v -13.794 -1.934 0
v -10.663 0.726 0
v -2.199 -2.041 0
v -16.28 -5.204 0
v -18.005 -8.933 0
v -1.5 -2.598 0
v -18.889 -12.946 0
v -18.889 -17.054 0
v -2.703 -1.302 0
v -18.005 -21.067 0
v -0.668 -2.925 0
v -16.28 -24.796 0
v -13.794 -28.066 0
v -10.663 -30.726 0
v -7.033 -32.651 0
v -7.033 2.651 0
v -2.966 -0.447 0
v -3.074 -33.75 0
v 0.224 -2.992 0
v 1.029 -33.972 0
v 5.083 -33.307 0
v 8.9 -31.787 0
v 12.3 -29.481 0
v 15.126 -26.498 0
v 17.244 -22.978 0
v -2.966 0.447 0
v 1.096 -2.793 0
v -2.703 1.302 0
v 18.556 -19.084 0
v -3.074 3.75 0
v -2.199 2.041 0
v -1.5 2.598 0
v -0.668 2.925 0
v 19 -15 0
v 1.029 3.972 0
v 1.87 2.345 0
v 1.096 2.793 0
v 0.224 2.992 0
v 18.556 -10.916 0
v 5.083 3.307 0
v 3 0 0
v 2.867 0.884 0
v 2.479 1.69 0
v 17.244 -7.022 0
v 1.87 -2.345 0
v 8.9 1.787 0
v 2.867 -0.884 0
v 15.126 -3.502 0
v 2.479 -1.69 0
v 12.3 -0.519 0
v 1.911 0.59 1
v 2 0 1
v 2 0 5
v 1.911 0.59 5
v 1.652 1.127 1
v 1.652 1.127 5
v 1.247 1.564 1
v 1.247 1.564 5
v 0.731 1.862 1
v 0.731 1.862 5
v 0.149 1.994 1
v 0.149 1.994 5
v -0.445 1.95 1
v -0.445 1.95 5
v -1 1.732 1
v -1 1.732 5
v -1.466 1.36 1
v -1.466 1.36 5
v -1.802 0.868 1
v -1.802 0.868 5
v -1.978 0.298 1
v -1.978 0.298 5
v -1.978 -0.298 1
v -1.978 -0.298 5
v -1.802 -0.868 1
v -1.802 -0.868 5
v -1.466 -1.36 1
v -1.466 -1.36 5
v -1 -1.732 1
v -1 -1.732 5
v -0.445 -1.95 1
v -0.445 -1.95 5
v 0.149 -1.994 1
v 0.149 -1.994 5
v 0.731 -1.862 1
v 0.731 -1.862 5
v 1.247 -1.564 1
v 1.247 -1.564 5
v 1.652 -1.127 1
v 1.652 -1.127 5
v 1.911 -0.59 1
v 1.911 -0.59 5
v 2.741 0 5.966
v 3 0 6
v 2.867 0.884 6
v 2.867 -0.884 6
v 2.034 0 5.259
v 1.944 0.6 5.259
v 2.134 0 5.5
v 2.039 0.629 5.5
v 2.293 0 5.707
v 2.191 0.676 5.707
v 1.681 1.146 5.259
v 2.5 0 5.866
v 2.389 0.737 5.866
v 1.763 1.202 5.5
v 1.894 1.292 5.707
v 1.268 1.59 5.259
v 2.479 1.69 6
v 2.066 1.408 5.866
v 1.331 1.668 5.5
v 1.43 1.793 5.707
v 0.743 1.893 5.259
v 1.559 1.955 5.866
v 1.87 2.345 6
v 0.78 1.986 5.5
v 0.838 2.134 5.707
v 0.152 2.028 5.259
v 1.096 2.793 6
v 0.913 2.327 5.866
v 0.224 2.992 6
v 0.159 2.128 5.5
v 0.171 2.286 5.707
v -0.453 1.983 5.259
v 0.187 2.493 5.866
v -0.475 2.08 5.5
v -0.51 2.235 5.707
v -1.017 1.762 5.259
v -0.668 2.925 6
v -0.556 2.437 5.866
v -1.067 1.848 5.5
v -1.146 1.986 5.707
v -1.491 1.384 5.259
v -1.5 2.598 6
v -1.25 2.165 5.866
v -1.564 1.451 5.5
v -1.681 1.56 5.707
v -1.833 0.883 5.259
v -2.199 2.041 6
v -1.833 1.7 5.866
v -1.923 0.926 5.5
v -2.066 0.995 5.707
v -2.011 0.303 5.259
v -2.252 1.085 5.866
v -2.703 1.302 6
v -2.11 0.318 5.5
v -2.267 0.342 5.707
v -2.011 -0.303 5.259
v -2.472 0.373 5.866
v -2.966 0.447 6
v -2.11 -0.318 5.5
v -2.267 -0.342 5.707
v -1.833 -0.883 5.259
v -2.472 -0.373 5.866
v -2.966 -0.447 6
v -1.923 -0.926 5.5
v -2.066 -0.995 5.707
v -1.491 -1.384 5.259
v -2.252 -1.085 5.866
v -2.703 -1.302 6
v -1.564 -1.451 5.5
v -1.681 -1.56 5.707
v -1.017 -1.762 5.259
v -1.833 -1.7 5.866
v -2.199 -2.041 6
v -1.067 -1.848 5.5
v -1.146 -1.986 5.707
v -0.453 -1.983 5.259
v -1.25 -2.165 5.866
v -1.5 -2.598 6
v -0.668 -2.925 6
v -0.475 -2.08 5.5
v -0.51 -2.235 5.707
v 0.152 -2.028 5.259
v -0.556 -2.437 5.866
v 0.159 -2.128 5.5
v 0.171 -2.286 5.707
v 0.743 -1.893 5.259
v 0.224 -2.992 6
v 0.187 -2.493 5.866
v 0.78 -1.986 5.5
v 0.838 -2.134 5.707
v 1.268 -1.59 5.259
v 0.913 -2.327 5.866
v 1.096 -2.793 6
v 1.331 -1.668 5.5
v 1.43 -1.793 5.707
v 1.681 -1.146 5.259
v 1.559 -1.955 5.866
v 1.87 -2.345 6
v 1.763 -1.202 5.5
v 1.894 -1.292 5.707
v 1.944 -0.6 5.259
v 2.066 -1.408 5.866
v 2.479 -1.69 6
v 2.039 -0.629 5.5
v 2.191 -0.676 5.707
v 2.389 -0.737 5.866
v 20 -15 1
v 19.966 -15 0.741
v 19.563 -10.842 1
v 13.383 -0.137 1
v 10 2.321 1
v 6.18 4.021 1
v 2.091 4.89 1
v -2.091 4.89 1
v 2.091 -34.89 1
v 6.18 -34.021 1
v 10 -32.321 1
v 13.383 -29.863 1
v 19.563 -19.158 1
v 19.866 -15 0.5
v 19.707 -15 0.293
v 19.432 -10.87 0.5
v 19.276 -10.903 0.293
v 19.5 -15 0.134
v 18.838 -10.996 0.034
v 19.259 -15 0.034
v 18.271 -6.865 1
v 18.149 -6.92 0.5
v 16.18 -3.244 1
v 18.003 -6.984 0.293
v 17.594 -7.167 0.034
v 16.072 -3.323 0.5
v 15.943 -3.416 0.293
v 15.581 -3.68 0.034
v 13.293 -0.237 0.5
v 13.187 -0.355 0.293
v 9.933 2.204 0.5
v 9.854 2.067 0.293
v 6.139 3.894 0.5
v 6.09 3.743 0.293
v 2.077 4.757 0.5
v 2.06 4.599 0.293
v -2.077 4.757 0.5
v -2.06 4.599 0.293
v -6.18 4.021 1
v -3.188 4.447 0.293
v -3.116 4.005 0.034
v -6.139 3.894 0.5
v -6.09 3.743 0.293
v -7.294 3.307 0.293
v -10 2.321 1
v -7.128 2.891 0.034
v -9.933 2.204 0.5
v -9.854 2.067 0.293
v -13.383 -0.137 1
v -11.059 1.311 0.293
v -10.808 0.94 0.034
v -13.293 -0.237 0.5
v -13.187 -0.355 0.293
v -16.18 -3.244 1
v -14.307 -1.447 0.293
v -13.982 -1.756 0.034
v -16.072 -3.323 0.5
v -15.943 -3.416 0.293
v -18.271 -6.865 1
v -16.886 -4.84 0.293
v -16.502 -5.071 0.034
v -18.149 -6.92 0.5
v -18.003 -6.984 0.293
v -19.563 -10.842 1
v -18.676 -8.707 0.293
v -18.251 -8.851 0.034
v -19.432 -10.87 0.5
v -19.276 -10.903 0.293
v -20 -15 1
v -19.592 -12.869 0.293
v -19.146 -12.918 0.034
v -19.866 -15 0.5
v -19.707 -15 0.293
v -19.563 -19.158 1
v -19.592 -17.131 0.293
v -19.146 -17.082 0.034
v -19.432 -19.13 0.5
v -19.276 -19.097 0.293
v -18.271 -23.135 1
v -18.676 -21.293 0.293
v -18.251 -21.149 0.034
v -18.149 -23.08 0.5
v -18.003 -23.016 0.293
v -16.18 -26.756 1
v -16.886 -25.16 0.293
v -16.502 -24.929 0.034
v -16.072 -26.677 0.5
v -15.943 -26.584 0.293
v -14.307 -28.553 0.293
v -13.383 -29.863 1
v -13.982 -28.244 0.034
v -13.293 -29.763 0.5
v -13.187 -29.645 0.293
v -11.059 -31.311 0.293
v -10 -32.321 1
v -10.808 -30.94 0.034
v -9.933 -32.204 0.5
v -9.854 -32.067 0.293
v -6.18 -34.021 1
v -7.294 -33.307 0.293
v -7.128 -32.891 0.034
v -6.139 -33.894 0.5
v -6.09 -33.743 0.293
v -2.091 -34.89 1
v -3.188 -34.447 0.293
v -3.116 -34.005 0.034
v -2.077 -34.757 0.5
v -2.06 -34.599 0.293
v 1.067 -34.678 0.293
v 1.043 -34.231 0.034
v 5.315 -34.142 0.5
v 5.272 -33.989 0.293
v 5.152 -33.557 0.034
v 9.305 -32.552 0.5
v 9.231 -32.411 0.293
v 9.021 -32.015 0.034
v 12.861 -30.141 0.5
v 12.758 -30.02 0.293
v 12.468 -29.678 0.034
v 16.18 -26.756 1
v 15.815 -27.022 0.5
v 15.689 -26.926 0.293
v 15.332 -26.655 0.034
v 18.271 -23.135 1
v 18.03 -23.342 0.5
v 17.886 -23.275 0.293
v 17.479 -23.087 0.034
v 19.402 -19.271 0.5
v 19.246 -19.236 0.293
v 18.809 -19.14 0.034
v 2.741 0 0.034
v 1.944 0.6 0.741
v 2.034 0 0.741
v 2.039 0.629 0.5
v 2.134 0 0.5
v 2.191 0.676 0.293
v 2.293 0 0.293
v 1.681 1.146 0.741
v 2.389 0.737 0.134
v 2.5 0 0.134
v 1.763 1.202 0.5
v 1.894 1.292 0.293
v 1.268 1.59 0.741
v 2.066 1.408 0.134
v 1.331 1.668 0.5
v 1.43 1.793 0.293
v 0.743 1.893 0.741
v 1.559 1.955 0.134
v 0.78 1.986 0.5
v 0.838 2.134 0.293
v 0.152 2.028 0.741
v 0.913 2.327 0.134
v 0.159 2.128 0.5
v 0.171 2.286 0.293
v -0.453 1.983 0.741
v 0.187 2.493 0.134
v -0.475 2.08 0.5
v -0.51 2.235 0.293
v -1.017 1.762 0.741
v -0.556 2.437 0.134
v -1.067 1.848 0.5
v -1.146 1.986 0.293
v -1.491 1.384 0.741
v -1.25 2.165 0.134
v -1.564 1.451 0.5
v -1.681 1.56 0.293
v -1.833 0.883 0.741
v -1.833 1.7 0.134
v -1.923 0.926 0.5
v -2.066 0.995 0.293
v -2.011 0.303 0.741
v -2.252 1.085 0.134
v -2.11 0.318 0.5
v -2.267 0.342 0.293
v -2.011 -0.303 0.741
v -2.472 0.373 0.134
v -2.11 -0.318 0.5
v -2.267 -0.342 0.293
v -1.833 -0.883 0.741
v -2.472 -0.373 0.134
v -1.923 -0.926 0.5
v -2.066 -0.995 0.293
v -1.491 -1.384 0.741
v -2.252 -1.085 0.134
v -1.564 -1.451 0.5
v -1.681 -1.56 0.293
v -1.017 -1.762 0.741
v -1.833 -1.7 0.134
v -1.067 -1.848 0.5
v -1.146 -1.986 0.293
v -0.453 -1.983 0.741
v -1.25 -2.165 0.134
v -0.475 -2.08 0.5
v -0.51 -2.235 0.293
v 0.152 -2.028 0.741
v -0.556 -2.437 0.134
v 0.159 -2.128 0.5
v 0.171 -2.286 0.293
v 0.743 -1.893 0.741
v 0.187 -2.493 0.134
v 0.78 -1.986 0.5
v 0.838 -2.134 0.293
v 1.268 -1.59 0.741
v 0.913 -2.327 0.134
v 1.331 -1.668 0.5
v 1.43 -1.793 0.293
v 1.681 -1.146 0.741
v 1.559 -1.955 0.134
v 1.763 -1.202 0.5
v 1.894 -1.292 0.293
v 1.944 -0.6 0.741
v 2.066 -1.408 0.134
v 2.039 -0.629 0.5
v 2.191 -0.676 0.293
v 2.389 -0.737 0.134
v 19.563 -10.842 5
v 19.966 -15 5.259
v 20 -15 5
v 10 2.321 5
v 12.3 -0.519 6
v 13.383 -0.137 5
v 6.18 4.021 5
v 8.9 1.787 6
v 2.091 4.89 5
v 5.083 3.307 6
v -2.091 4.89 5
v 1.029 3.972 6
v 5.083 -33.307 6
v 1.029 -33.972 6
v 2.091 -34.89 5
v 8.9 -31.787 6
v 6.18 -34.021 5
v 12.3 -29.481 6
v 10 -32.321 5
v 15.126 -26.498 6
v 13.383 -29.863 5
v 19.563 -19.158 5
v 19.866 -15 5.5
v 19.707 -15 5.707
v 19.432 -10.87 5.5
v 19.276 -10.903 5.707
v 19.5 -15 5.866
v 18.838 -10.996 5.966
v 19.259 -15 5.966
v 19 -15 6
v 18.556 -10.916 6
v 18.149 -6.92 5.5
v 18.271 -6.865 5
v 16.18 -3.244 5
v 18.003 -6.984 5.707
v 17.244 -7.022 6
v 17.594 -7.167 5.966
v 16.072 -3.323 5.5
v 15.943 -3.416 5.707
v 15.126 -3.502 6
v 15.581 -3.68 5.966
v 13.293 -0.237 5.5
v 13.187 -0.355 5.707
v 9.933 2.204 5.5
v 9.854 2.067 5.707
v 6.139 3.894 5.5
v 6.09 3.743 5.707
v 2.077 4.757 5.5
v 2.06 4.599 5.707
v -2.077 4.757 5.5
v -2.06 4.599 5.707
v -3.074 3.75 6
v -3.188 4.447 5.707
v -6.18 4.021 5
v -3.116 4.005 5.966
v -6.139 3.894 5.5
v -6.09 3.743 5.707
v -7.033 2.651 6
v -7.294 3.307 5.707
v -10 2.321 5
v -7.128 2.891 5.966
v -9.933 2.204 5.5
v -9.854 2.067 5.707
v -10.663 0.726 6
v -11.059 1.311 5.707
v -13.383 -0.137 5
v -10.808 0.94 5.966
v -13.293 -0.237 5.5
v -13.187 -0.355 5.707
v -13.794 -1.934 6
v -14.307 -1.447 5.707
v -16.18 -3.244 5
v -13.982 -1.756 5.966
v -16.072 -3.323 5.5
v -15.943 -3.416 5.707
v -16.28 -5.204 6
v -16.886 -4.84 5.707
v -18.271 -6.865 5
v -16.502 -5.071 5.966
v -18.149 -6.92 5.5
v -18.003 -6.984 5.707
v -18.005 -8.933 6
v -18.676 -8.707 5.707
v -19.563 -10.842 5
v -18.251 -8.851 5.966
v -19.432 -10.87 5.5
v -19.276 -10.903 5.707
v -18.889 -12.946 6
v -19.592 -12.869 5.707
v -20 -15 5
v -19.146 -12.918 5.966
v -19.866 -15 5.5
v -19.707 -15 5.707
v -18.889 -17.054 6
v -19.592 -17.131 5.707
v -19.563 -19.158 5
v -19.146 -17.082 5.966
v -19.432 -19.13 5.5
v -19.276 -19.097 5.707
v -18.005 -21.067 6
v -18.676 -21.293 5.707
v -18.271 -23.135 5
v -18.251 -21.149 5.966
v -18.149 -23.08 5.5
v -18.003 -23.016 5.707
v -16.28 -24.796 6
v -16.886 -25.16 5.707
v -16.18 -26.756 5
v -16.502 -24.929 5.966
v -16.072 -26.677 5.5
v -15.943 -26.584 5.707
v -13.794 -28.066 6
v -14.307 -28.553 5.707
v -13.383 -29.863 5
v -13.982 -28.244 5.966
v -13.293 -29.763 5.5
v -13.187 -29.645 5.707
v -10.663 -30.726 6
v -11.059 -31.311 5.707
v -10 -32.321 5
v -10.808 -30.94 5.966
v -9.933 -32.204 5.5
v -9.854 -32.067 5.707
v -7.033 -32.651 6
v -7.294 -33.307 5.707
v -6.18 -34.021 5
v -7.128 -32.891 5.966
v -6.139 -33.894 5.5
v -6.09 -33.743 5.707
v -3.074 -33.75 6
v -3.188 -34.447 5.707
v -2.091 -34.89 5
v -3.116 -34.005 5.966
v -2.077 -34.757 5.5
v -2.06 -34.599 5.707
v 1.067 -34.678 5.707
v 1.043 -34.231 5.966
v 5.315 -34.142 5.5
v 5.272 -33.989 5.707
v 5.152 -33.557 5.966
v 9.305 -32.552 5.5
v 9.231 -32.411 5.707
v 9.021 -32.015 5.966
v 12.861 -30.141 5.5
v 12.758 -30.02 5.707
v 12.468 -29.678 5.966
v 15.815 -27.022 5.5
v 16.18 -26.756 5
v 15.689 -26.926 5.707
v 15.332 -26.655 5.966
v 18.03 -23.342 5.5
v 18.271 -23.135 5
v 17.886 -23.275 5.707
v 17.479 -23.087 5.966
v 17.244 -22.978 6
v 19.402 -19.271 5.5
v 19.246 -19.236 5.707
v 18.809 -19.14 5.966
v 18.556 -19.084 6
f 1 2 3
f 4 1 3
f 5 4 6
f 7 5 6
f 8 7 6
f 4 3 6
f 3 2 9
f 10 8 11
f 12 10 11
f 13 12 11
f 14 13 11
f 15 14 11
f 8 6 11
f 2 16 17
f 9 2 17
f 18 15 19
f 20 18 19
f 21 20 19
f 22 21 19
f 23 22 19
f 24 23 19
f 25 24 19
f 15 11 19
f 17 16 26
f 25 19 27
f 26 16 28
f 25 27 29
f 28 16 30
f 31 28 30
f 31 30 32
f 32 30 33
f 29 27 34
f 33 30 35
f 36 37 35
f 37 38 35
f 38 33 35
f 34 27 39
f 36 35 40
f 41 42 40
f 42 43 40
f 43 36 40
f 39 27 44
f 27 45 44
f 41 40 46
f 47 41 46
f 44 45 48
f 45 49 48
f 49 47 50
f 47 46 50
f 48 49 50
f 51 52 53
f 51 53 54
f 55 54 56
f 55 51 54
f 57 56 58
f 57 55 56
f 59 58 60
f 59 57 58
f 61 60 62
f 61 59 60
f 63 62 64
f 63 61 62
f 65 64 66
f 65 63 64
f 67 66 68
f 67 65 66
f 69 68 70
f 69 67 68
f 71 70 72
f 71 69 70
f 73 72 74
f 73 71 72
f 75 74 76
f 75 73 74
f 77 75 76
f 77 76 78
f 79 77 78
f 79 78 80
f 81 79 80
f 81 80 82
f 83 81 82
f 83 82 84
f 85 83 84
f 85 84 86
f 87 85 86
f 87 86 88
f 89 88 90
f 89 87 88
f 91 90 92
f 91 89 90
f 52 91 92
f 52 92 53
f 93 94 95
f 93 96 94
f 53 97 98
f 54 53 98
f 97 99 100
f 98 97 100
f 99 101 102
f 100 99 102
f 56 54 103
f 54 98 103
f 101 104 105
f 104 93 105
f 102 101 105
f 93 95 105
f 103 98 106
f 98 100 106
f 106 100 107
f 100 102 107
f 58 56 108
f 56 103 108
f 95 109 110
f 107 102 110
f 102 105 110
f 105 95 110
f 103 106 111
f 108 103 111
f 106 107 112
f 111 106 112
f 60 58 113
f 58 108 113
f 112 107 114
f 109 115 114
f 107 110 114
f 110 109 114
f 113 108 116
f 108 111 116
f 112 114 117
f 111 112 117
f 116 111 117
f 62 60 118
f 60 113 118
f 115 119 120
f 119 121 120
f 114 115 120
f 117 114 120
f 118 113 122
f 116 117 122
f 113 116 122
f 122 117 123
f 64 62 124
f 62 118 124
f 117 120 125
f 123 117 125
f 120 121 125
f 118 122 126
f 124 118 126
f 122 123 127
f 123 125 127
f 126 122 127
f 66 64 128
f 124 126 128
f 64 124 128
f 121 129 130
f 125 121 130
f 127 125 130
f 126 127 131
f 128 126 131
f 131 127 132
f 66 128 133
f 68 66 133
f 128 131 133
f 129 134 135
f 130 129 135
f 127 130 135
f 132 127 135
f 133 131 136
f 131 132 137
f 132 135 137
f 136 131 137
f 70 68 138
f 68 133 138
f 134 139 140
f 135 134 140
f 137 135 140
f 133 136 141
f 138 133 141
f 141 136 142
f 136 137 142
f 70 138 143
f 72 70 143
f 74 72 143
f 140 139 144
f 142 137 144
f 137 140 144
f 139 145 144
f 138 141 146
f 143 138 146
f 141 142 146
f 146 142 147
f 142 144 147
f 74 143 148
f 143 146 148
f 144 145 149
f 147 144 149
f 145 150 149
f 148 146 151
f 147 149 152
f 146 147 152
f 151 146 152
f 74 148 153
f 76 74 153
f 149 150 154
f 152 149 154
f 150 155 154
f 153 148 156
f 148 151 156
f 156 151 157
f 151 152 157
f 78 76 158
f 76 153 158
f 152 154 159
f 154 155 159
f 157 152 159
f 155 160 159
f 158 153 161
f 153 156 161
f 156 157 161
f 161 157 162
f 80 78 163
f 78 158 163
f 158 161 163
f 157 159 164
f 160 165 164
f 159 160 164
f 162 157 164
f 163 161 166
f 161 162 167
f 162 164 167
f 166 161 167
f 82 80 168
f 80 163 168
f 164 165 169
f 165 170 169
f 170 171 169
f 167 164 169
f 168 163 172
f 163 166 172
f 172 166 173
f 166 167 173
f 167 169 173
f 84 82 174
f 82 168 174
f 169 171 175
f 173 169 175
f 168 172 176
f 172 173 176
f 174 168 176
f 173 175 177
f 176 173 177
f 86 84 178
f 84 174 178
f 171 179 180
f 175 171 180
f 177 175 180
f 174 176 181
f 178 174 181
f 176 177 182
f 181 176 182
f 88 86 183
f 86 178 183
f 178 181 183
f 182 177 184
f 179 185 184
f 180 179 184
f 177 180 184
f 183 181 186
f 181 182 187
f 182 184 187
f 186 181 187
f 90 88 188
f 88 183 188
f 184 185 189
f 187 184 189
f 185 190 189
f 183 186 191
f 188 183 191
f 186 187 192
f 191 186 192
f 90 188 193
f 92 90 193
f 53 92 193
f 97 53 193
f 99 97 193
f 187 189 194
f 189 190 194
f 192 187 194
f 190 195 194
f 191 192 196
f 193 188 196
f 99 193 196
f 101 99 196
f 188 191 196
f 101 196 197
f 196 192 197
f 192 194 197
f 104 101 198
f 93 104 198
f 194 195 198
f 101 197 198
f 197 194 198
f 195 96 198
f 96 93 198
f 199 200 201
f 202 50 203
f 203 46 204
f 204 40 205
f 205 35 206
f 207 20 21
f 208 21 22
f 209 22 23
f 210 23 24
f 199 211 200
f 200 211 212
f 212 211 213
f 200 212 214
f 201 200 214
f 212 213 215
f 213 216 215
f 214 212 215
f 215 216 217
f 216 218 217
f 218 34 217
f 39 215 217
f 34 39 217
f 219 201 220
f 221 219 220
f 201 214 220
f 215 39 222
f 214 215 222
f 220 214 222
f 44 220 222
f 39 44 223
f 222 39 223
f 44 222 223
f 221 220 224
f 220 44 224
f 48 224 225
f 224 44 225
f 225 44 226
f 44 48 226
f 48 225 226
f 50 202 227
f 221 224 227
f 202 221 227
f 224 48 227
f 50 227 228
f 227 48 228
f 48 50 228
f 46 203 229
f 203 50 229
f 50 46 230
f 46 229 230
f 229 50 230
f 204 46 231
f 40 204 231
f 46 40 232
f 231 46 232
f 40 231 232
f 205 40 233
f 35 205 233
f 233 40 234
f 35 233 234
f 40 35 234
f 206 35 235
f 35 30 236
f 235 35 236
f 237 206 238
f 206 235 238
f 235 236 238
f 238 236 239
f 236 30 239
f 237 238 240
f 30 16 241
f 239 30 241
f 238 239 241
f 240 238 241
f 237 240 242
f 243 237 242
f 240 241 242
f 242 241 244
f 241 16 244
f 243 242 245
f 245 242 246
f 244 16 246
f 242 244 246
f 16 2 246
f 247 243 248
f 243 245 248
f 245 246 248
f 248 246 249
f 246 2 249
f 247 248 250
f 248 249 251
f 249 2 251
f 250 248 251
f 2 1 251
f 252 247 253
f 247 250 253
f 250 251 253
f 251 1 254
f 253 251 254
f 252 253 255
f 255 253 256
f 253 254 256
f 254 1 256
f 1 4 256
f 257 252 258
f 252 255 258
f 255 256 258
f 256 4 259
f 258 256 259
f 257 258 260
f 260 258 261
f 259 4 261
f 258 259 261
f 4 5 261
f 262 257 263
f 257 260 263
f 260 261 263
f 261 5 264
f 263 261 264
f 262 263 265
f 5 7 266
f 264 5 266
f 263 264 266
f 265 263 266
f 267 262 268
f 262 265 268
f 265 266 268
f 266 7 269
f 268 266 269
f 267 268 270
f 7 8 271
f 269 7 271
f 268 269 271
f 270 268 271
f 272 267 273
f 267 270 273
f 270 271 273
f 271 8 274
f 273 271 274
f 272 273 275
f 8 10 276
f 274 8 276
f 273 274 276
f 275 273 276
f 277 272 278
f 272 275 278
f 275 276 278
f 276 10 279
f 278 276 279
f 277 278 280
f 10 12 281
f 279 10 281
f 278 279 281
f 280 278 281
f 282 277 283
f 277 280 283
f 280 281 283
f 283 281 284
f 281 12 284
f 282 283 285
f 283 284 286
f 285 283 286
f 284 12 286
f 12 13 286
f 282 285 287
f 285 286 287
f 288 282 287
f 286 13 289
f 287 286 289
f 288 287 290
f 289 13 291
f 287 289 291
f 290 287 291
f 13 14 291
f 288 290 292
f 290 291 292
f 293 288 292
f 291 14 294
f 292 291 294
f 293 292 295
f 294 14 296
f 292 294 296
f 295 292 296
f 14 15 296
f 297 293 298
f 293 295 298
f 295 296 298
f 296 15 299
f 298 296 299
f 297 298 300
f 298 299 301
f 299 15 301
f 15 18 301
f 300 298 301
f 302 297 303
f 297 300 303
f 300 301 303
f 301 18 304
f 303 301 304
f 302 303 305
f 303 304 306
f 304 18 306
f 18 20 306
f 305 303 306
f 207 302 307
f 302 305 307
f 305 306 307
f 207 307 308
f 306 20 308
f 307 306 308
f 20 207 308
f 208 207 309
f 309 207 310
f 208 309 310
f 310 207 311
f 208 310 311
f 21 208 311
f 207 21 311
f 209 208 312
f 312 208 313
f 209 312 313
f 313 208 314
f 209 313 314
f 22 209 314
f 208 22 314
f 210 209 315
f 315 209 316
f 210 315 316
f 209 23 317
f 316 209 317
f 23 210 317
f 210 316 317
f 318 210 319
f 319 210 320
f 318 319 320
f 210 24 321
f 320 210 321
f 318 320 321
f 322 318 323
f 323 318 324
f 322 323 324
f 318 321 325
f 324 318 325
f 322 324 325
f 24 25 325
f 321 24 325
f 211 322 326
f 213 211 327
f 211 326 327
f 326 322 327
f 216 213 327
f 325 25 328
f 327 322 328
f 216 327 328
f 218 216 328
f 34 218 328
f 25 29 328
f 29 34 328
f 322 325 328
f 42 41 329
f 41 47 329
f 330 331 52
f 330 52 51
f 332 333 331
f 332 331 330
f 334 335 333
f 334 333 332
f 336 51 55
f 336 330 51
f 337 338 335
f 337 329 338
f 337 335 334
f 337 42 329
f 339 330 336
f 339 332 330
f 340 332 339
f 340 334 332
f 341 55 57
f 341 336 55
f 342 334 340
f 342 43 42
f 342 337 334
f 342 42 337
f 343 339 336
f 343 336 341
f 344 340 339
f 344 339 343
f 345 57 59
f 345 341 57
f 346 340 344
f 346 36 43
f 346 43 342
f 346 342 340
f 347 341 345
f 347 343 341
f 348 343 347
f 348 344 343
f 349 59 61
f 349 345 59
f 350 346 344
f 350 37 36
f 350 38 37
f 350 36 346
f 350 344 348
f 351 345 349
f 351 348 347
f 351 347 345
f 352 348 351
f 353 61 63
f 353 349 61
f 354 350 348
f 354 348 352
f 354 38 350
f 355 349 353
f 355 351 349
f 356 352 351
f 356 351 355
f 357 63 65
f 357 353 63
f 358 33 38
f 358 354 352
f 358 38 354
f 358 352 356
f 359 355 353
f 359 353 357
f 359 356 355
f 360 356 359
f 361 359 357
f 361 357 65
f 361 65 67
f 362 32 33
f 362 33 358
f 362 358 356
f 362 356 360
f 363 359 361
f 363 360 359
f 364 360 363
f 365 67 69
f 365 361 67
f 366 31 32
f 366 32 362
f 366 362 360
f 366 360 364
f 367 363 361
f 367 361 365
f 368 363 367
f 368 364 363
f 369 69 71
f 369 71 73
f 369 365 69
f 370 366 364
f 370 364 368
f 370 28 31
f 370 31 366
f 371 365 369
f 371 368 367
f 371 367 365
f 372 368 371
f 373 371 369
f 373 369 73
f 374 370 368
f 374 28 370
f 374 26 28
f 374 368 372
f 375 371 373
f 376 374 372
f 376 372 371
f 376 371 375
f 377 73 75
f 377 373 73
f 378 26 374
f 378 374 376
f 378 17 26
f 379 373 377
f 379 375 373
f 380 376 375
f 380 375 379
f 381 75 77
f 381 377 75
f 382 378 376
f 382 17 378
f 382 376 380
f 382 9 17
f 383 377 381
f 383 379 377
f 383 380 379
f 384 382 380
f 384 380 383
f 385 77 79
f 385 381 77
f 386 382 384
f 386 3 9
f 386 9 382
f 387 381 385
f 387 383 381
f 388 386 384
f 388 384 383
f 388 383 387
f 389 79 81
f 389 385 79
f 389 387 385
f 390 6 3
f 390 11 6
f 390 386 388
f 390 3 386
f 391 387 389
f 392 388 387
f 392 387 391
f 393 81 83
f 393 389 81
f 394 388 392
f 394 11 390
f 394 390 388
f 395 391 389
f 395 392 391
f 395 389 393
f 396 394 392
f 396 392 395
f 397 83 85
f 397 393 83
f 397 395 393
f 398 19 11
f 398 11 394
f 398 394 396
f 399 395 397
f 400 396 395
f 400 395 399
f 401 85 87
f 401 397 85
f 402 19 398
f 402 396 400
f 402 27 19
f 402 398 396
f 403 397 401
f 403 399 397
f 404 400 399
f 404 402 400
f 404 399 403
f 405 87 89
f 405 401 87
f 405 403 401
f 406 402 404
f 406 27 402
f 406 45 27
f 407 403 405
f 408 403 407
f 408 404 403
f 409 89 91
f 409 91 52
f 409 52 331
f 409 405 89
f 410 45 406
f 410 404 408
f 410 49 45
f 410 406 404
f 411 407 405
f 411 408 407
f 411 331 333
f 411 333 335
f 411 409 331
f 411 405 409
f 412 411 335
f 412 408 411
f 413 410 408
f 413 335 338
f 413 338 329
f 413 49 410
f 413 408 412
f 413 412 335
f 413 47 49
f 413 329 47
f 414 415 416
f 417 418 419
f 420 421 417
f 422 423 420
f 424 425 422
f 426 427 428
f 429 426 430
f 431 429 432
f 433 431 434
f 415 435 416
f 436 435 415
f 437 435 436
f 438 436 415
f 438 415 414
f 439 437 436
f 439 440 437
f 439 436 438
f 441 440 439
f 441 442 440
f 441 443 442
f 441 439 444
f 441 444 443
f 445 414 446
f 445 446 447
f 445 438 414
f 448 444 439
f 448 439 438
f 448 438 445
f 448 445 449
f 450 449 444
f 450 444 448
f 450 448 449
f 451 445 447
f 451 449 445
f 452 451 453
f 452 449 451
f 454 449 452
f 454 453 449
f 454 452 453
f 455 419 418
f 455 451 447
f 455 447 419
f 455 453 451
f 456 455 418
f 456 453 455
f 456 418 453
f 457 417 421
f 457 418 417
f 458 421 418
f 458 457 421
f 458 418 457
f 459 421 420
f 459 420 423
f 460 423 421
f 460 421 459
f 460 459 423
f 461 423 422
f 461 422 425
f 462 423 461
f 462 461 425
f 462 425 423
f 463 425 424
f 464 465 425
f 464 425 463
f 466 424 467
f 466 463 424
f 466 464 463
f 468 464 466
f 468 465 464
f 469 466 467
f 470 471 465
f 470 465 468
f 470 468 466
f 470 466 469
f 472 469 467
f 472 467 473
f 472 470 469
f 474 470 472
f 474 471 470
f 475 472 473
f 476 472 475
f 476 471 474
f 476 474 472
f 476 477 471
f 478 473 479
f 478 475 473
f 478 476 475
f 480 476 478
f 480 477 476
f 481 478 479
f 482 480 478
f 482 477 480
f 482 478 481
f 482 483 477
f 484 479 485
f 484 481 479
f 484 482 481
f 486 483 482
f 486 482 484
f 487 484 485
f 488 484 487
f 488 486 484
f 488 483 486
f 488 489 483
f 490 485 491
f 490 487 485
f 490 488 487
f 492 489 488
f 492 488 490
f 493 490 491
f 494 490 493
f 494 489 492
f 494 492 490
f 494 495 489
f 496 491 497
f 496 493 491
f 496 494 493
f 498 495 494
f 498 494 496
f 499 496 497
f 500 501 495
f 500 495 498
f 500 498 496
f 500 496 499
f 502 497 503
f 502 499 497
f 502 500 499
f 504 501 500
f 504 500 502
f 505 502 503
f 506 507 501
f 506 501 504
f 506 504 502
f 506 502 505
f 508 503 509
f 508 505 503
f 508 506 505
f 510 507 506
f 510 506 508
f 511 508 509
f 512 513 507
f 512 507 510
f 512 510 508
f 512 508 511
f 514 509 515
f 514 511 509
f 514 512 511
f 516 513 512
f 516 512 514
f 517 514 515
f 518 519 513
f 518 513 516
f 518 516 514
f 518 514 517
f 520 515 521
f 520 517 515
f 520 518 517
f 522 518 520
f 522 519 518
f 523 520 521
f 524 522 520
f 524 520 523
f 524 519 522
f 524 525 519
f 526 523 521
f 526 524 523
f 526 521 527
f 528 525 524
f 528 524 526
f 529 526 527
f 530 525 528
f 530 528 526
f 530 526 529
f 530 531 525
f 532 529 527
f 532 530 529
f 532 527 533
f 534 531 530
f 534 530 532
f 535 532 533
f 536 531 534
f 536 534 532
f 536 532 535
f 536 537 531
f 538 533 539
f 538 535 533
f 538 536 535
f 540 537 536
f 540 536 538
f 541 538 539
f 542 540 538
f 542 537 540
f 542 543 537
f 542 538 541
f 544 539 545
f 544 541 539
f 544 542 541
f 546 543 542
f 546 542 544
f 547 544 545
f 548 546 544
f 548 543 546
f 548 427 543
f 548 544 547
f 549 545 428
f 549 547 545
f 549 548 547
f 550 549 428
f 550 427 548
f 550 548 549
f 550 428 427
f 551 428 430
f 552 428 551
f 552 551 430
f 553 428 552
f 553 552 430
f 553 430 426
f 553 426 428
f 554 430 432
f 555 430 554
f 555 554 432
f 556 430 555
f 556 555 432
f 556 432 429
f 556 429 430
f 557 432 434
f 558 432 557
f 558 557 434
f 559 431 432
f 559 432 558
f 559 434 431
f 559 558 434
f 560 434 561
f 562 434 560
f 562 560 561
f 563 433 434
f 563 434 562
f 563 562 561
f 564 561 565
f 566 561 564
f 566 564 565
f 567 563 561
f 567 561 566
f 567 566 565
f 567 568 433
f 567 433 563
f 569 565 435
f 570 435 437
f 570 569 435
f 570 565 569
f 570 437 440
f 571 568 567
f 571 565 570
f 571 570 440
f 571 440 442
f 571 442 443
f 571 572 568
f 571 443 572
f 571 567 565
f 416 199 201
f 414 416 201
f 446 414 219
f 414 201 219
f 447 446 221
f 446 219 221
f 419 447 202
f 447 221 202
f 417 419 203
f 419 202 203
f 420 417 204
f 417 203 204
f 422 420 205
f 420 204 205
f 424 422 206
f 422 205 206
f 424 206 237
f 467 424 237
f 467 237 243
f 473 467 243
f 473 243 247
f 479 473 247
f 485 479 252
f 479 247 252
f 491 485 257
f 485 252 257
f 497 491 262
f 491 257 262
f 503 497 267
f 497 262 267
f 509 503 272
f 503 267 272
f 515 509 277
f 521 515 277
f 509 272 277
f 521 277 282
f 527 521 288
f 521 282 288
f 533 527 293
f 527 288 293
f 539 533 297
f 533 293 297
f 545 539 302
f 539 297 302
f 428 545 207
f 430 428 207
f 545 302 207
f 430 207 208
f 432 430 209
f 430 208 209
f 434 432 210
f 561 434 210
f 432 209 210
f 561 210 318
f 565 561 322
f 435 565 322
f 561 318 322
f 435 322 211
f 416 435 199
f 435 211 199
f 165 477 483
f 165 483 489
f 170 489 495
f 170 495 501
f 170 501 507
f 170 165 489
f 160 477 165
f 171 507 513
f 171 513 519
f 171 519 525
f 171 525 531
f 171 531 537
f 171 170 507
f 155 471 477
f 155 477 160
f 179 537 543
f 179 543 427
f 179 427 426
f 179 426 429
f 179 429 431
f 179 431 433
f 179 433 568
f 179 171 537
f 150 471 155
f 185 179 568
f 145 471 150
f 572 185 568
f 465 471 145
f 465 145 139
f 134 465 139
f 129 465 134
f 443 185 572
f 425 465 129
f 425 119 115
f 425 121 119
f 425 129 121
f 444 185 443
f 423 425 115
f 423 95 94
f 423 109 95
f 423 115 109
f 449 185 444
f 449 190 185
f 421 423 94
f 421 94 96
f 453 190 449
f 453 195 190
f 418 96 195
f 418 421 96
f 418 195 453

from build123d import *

# Parameters (mm, degrees)
F0_R     = 20
F0_R_2   = 2
F1_DEPTH = 6
F2_R     = 1


with BuildPart() as f1:
    # F0 (on Top) → F1 (new body)
    with BuildSketch(Plane.XY):
        with Locations((0, -15)):
            Circle(F0_R)
        Circle(F0_R_2, mode=Mode.SUBTRACT)
    extrude(amount=F1_DEPTH)

    # F2
    f2_edges = [f1.edges().sort_by_distance(p)[0] for p in [
        (-20, -15, 6),
        (-2, 0, 6),
        (-20, -15, 0),
        (-2, 0, 0),
    ]]
    fillet(f2_edges, radius=F2_R)


solid = f1.part
